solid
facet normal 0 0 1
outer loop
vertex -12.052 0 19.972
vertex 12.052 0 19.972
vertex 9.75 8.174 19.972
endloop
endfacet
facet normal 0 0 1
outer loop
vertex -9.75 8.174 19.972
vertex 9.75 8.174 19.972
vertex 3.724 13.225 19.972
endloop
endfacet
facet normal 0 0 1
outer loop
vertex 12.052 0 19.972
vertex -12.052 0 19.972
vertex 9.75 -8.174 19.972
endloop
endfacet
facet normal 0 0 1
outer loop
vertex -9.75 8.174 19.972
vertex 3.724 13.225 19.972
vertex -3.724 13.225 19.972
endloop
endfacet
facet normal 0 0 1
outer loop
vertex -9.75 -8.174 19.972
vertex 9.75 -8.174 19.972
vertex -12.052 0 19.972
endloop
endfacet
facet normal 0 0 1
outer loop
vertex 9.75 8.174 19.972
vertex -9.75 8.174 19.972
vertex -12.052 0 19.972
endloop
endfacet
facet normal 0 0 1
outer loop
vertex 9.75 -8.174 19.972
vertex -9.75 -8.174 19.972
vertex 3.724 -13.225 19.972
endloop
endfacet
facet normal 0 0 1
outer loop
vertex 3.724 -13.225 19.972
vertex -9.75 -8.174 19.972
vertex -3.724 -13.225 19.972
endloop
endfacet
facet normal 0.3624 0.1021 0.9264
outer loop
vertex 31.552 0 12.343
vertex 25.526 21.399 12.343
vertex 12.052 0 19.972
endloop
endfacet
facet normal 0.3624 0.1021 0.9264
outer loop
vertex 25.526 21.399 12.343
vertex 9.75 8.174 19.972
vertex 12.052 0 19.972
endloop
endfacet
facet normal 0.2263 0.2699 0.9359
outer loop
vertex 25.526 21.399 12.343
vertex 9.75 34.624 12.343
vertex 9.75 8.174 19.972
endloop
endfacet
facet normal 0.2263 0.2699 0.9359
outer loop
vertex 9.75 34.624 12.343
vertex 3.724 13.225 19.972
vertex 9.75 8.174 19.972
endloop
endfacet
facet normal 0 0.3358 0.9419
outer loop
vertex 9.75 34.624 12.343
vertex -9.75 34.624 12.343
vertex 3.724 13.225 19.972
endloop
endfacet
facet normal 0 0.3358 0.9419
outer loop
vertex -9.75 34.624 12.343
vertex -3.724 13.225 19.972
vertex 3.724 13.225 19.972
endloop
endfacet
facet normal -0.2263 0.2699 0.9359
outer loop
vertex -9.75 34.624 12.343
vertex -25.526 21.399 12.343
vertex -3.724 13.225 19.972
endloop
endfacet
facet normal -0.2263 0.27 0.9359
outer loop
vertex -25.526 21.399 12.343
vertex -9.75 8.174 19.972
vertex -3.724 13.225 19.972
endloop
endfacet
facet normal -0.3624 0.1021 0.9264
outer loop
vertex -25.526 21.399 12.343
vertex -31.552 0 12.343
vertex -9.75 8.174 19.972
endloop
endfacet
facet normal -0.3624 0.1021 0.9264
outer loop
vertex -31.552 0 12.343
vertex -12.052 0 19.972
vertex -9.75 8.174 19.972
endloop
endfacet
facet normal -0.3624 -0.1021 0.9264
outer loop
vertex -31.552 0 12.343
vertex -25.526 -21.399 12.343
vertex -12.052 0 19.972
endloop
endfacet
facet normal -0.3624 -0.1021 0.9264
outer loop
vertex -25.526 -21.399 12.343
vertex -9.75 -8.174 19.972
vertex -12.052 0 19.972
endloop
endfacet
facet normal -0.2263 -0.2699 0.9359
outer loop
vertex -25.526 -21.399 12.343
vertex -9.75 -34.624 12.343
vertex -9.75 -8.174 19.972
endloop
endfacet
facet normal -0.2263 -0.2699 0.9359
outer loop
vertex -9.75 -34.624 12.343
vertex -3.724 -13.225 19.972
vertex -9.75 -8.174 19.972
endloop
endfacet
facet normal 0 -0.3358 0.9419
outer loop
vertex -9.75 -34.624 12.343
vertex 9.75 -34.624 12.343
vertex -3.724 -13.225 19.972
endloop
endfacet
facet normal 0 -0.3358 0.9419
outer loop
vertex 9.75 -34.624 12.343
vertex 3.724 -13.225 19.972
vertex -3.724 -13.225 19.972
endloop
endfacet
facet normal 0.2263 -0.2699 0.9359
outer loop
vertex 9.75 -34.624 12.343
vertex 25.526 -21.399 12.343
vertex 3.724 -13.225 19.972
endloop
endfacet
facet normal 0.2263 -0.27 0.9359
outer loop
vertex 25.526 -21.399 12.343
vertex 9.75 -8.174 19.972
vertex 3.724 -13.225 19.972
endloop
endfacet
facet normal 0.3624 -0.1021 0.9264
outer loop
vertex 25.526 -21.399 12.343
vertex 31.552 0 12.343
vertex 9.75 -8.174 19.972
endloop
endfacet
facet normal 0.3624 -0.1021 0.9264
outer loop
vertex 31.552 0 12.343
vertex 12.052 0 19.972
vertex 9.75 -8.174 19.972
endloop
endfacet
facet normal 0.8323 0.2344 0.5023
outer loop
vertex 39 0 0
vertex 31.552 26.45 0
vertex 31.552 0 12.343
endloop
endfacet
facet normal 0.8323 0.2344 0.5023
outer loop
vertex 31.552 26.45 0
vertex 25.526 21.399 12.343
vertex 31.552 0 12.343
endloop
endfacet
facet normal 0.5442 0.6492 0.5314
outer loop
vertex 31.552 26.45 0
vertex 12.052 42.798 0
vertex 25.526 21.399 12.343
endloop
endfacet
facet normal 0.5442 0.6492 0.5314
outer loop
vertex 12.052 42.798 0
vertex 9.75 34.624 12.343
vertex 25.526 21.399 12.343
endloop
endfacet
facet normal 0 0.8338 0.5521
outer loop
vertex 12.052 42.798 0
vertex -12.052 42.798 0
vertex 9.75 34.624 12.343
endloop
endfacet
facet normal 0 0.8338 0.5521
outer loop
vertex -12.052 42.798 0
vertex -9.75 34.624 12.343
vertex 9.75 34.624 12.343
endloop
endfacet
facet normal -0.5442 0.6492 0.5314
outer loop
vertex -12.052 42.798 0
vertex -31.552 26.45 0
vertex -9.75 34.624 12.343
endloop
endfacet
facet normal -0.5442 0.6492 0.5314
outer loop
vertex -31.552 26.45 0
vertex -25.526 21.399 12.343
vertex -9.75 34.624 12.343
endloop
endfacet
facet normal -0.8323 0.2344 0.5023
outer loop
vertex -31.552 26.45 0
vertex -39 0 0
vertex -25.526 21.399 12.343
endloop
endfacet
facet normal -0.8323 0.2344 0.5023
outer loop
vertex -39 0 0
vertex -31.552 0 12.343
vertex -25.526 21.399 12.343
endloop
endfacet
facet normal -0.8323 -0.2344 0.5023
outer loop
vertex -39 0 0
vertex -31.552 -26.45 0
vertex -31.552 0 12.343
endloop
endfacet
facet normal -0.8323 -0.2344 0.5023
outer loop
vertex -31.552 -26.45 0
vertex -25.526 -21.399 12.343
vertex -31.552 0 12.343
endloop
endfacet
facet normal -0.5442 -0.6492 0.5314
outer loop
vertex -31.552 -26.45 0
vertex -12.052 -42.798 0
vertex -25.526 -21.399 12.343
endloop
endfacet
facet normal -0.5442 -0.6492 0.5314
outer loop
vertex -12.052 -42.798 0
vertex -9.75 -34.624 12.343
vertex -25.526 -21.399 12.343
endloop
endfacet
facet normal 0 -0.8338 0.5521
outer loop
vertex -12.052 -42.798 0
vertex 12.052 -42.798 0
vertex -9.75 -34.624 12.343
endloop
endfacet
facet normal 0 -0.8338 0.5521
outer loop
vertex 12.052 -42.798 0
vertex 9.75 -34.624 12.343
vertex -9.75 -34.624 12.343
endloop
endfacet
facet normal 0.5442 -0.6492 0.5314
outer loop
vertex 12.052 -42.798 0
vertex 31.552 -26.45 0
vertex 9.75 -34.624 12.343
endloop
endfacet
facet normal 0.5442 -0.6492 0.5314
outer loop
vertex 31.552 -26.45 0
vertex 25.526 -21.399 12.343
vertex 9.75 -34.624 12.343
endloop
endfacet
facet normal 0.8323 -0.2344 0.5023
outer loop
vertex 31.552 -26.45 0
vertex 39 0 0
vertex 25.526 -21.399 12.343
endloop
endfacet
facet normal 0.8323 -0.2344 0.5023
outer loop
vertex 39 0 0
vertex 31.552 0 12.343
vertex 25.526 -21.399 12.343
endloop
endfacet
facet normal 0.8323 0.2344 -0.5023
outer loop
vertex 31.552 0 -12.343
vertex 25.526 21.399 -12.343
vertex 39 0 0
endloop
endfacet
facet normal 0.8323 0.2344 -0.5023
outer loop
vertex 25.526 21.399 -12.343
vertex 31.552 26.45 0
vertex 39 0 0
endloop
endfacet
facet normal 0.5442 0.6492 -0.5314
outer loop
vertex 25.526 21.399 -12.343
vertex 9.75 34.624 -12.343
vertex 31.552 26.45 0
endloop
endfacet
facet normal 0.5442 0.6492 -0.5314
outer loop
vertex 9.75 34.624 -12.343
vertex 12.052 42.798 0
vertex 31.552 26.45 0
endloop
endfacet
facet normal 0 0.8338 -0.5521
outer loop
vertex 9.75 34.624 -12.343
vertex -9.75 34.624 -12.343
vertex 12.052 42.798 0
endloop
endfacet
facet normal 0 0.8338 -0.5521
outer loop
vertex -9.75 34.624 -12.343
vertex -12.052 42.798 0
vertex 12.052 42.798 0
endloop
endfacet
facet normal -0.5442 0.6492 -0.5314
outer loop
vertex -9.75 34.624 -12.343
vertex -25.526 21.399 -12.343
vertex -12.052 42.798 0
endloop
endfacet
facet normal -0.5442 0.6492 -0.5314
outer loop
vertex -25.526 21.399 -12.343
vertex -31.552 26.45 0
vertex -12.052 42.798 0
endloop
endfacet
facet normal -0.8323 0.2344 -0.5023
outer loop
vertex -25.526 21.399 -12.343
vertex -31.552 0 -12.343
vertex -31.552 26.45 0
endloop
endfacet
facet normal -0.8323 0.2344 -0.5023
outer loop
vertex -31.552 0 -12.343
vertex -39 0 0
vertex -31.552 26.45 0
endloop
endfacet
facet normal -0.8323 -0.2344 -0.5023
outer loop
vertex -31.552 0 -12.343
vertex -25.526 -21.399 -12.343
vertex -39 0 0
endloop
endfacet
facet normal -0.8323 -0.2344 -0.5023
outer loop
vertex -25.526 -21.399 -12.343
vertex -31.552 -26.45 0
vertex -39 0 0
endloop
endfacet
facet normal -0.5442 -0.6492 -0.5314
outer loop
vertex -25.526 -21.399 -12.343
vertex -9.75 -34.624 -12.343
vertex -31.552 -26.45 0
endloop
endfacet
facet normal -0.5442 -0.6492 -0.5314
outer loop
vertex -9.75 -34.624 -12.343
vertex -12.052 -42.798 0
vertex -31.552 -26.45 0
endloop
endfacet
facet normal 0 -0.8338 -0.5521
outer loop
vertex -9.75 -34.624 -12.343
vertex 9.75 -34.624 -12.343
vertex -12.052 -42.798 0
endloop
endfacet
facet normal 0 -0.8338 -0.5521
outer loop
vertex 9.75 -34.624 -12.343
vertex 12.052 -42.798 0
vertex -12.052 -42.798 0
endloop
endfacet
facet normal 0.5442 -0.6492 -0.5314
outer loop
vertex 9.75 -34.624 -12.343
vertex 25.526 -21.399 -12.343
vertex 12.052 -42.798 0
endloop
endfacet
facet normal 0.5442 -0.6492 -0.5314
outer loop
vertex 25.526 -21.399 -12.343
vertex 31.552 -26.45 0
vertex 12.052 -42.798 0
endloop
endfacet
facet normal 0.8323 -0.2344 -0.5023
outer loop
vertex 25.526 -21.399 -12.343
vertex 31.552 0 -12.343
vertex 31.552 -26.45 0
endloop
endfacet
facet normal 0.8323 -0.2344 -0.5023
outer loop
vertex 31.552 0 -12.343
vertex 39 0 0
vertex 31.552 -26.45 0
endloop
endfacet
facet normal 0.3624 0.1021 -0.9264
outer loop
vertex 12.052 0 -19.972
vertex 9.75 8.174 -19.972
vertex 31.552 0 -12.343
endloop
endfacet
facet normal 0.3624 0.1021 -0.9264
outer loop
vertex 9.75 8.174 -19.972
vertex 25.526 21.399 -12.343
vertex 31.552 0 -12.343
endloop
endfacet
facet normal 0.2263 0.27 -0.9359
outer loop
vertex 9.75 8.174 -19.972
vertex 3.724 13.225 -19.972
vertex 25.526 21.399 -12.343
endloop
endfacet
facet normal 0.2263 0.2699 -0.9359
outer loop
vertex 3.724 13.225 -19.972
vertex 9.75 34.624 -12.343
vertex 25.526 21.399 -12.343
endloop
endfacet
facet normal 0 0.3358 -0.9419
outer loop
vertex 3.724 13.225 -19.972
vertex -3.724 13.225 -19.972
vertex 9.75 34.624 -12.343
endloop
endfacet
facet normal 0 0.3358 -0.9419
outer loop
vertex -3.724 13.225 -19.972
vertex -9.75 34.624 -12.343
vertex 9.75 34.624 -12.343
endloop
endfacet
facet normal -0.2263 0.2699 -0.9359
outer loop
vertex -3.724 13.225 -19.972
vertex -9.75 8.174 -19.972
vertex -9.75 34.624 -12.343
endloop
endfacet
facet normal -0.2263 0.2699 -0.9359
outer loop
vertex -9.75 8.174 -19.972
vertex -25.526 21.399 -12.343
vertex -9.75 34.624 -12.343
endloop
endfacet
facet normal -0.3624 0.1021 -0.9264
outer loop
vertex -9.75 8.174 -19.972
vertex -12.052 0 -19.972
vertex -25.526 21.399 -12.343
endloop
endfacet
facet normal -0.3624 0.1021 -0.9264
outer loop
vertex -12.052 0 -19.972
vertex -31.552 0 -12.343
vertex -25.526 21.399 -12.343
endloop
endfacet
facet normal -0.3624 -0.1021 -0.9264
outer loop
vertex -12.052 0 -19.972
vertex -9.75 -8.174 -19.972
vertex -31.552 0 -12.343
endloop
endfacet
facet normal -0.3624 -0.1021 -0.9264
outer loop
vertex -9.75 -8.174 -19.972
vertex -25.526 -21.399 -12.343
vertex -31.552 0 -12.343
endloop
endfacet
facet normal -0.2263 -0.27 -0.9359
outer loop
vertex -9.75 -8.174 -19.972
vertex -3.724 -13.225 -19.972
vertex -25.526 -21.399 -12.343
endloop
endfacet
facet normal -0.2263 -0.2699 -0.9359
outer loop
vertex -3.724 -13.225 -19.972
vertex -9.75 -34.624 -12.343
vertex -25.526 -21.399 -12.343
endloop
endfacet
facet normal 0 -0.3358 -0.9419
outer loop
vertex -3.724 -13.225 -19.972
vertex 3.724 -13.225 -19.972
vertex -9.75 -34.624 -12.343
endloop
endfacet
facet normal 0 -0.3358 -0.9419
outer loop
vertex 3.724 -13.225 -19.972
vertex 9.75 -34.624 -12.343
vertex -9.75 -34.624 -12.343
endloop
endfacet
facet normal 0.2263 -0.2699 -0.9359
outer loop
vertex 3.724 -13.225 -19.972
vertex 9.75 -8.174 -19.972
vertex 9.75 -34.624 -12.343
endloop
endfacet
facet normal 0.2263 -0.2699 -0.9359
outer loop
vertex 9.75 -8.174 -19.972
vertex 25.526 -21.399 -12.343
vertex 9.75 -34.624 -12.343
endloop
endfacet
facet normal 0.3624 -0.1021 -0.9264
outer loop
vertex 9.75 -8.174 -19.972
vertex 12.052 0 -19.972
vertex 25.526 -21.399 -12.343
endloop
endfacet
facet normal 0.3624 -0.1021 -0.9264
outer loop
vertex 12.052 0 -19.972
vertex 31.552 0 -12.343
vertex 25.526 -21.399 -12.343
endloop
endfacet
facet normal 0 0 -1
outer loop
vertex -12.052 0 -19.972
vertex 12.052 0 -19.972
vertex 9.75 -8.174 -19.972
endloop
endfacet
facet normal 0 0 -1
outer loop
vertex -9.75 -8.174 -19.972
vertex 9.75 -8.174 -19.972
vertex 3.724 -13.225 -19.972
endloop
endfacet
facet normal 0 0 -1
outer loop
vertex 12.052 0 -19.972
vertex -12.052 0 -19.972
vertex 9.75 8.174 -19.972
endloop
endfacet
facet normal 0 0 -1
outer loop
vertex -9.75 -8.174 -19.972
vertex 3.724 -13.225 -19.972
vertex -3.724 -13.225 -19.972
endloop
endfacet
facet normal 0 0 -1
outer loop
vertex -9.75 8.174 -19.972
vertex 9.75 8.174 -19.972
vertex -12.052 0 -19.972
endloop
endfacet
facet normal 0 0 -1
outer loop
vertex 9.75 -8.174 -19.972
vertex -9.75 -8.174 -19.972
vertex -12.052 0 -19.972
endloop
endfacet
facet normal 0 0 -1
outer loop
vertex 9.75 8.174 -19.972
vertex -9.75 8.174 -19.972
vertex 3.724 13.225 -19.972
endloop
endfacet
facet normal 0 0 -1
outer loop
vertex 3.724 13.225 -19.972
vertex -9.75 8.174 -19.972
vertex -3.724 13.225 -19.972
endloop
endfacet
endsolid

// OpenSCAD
// Generated by SolidPython 1.0.1 on 2020-07-29 00:46:51


scale(v = [13, 15, 7]) {
	sphere(r = 3);
}
/***********************************************
*********      SolidPython code:      **********
************************************************
 
# import packages: SolidPython
from solid import *
from solid.utils import *
from itertools import chain, combinations, permutations


class Resize:

    def __init__(self, scad_file):
        self.scad_file = scad_file
        #self.scad_file = import_scad(scad_file)
        # cone/cylinder param:
        self.r1 = 0
        self.r2 = 0
        self.h = 0
        # rectangular prism param:
        self.w = 0
        self.l = 0
        # ellipse param:
        self.r = 0

    # import OpenScad code (file name corresponds to shape)


    # classify shape + parameters
    def assign(self, param1, param2, param3):
        if self.scad_file == 'cone.scad':
            self.r1 = param1
            self.r2 = param2
            self.h = param3
        elif self.scad_file == 'cylinder.scad':
            self.r1 = param1
            self.r2 = param2
            self.h = param3
        elif self.scad_file == 'rectangularPrism.scad':
            self.h = param1
            self.l = param2
            self.w = param3
        else:
            self.r = param1
            self.h = param2

    # resize parameters
    def iterate(self):
        x = range(3, 20, 2)
        i = 1
        if self.scad_file == 'cone.scad':
            tempList = list(permutations(x, 2))
            for temp in tempList:
                param1 = temp[0]
                param2 = temp[1]
                filepath = 'produced_scad_files/' + 'cone' + str(param1) + '_' + str(param2) + '_' + '.scad'
                scad_render_to_file(cylinder(h=param1, r1=param2, r2=0), filepath)

        elif self.scad_file == 'cylinder.scad':
            tempList = list(permutations(x, 3))
            for temp in tempList:
                param1 = temp[0]
                param2 = temp[1]
                filepath = 'produced_scad_files/' + 'cylinder' + str(param1) + '_' + str(param2) + '_' + '.scad'
                scad_render_to_file(cylinder(h=param1, r1=param2, r2=param2), filepath)

        elif self.scad_file == 'rectangularPrism.scad':
            tempList = list(permutations(x, 3))
            for temp in tempList:
                param1 = temp[0]
                param2 = temp[1]
                param3 = temp[2]
                filepath = 'produced_scad_files/' + 'rectangularPrism' + str(param1) + '_' + str(param2) + '_' + str(
                    param3) + '.scad'
                scad_render_to_file(cube(size=(param1, param2, param3)), filepath)

        elif self.scad_file == 'ellipse.scad':
            tempList = list(permutations(x, 4))
            for temp in tempList:
                param1 = temp[0]
                param2 = temp[1]
                param3 = temp[2]
                param4 = temp[3]
                filepath = 'produced_scad_files/' + 'ellipse' + str(param1) + '_' + str(param2) + '_' + str(param3) + '_' + str(param4) + '.scad'
                scad_render_to_file(scale([param1, param2, param3])(sphere(r=param4)), filepath)

    def render_to_scadfile(self):
        scad_render_to_file(scad, 'example.scad') 
 
************************************************/
